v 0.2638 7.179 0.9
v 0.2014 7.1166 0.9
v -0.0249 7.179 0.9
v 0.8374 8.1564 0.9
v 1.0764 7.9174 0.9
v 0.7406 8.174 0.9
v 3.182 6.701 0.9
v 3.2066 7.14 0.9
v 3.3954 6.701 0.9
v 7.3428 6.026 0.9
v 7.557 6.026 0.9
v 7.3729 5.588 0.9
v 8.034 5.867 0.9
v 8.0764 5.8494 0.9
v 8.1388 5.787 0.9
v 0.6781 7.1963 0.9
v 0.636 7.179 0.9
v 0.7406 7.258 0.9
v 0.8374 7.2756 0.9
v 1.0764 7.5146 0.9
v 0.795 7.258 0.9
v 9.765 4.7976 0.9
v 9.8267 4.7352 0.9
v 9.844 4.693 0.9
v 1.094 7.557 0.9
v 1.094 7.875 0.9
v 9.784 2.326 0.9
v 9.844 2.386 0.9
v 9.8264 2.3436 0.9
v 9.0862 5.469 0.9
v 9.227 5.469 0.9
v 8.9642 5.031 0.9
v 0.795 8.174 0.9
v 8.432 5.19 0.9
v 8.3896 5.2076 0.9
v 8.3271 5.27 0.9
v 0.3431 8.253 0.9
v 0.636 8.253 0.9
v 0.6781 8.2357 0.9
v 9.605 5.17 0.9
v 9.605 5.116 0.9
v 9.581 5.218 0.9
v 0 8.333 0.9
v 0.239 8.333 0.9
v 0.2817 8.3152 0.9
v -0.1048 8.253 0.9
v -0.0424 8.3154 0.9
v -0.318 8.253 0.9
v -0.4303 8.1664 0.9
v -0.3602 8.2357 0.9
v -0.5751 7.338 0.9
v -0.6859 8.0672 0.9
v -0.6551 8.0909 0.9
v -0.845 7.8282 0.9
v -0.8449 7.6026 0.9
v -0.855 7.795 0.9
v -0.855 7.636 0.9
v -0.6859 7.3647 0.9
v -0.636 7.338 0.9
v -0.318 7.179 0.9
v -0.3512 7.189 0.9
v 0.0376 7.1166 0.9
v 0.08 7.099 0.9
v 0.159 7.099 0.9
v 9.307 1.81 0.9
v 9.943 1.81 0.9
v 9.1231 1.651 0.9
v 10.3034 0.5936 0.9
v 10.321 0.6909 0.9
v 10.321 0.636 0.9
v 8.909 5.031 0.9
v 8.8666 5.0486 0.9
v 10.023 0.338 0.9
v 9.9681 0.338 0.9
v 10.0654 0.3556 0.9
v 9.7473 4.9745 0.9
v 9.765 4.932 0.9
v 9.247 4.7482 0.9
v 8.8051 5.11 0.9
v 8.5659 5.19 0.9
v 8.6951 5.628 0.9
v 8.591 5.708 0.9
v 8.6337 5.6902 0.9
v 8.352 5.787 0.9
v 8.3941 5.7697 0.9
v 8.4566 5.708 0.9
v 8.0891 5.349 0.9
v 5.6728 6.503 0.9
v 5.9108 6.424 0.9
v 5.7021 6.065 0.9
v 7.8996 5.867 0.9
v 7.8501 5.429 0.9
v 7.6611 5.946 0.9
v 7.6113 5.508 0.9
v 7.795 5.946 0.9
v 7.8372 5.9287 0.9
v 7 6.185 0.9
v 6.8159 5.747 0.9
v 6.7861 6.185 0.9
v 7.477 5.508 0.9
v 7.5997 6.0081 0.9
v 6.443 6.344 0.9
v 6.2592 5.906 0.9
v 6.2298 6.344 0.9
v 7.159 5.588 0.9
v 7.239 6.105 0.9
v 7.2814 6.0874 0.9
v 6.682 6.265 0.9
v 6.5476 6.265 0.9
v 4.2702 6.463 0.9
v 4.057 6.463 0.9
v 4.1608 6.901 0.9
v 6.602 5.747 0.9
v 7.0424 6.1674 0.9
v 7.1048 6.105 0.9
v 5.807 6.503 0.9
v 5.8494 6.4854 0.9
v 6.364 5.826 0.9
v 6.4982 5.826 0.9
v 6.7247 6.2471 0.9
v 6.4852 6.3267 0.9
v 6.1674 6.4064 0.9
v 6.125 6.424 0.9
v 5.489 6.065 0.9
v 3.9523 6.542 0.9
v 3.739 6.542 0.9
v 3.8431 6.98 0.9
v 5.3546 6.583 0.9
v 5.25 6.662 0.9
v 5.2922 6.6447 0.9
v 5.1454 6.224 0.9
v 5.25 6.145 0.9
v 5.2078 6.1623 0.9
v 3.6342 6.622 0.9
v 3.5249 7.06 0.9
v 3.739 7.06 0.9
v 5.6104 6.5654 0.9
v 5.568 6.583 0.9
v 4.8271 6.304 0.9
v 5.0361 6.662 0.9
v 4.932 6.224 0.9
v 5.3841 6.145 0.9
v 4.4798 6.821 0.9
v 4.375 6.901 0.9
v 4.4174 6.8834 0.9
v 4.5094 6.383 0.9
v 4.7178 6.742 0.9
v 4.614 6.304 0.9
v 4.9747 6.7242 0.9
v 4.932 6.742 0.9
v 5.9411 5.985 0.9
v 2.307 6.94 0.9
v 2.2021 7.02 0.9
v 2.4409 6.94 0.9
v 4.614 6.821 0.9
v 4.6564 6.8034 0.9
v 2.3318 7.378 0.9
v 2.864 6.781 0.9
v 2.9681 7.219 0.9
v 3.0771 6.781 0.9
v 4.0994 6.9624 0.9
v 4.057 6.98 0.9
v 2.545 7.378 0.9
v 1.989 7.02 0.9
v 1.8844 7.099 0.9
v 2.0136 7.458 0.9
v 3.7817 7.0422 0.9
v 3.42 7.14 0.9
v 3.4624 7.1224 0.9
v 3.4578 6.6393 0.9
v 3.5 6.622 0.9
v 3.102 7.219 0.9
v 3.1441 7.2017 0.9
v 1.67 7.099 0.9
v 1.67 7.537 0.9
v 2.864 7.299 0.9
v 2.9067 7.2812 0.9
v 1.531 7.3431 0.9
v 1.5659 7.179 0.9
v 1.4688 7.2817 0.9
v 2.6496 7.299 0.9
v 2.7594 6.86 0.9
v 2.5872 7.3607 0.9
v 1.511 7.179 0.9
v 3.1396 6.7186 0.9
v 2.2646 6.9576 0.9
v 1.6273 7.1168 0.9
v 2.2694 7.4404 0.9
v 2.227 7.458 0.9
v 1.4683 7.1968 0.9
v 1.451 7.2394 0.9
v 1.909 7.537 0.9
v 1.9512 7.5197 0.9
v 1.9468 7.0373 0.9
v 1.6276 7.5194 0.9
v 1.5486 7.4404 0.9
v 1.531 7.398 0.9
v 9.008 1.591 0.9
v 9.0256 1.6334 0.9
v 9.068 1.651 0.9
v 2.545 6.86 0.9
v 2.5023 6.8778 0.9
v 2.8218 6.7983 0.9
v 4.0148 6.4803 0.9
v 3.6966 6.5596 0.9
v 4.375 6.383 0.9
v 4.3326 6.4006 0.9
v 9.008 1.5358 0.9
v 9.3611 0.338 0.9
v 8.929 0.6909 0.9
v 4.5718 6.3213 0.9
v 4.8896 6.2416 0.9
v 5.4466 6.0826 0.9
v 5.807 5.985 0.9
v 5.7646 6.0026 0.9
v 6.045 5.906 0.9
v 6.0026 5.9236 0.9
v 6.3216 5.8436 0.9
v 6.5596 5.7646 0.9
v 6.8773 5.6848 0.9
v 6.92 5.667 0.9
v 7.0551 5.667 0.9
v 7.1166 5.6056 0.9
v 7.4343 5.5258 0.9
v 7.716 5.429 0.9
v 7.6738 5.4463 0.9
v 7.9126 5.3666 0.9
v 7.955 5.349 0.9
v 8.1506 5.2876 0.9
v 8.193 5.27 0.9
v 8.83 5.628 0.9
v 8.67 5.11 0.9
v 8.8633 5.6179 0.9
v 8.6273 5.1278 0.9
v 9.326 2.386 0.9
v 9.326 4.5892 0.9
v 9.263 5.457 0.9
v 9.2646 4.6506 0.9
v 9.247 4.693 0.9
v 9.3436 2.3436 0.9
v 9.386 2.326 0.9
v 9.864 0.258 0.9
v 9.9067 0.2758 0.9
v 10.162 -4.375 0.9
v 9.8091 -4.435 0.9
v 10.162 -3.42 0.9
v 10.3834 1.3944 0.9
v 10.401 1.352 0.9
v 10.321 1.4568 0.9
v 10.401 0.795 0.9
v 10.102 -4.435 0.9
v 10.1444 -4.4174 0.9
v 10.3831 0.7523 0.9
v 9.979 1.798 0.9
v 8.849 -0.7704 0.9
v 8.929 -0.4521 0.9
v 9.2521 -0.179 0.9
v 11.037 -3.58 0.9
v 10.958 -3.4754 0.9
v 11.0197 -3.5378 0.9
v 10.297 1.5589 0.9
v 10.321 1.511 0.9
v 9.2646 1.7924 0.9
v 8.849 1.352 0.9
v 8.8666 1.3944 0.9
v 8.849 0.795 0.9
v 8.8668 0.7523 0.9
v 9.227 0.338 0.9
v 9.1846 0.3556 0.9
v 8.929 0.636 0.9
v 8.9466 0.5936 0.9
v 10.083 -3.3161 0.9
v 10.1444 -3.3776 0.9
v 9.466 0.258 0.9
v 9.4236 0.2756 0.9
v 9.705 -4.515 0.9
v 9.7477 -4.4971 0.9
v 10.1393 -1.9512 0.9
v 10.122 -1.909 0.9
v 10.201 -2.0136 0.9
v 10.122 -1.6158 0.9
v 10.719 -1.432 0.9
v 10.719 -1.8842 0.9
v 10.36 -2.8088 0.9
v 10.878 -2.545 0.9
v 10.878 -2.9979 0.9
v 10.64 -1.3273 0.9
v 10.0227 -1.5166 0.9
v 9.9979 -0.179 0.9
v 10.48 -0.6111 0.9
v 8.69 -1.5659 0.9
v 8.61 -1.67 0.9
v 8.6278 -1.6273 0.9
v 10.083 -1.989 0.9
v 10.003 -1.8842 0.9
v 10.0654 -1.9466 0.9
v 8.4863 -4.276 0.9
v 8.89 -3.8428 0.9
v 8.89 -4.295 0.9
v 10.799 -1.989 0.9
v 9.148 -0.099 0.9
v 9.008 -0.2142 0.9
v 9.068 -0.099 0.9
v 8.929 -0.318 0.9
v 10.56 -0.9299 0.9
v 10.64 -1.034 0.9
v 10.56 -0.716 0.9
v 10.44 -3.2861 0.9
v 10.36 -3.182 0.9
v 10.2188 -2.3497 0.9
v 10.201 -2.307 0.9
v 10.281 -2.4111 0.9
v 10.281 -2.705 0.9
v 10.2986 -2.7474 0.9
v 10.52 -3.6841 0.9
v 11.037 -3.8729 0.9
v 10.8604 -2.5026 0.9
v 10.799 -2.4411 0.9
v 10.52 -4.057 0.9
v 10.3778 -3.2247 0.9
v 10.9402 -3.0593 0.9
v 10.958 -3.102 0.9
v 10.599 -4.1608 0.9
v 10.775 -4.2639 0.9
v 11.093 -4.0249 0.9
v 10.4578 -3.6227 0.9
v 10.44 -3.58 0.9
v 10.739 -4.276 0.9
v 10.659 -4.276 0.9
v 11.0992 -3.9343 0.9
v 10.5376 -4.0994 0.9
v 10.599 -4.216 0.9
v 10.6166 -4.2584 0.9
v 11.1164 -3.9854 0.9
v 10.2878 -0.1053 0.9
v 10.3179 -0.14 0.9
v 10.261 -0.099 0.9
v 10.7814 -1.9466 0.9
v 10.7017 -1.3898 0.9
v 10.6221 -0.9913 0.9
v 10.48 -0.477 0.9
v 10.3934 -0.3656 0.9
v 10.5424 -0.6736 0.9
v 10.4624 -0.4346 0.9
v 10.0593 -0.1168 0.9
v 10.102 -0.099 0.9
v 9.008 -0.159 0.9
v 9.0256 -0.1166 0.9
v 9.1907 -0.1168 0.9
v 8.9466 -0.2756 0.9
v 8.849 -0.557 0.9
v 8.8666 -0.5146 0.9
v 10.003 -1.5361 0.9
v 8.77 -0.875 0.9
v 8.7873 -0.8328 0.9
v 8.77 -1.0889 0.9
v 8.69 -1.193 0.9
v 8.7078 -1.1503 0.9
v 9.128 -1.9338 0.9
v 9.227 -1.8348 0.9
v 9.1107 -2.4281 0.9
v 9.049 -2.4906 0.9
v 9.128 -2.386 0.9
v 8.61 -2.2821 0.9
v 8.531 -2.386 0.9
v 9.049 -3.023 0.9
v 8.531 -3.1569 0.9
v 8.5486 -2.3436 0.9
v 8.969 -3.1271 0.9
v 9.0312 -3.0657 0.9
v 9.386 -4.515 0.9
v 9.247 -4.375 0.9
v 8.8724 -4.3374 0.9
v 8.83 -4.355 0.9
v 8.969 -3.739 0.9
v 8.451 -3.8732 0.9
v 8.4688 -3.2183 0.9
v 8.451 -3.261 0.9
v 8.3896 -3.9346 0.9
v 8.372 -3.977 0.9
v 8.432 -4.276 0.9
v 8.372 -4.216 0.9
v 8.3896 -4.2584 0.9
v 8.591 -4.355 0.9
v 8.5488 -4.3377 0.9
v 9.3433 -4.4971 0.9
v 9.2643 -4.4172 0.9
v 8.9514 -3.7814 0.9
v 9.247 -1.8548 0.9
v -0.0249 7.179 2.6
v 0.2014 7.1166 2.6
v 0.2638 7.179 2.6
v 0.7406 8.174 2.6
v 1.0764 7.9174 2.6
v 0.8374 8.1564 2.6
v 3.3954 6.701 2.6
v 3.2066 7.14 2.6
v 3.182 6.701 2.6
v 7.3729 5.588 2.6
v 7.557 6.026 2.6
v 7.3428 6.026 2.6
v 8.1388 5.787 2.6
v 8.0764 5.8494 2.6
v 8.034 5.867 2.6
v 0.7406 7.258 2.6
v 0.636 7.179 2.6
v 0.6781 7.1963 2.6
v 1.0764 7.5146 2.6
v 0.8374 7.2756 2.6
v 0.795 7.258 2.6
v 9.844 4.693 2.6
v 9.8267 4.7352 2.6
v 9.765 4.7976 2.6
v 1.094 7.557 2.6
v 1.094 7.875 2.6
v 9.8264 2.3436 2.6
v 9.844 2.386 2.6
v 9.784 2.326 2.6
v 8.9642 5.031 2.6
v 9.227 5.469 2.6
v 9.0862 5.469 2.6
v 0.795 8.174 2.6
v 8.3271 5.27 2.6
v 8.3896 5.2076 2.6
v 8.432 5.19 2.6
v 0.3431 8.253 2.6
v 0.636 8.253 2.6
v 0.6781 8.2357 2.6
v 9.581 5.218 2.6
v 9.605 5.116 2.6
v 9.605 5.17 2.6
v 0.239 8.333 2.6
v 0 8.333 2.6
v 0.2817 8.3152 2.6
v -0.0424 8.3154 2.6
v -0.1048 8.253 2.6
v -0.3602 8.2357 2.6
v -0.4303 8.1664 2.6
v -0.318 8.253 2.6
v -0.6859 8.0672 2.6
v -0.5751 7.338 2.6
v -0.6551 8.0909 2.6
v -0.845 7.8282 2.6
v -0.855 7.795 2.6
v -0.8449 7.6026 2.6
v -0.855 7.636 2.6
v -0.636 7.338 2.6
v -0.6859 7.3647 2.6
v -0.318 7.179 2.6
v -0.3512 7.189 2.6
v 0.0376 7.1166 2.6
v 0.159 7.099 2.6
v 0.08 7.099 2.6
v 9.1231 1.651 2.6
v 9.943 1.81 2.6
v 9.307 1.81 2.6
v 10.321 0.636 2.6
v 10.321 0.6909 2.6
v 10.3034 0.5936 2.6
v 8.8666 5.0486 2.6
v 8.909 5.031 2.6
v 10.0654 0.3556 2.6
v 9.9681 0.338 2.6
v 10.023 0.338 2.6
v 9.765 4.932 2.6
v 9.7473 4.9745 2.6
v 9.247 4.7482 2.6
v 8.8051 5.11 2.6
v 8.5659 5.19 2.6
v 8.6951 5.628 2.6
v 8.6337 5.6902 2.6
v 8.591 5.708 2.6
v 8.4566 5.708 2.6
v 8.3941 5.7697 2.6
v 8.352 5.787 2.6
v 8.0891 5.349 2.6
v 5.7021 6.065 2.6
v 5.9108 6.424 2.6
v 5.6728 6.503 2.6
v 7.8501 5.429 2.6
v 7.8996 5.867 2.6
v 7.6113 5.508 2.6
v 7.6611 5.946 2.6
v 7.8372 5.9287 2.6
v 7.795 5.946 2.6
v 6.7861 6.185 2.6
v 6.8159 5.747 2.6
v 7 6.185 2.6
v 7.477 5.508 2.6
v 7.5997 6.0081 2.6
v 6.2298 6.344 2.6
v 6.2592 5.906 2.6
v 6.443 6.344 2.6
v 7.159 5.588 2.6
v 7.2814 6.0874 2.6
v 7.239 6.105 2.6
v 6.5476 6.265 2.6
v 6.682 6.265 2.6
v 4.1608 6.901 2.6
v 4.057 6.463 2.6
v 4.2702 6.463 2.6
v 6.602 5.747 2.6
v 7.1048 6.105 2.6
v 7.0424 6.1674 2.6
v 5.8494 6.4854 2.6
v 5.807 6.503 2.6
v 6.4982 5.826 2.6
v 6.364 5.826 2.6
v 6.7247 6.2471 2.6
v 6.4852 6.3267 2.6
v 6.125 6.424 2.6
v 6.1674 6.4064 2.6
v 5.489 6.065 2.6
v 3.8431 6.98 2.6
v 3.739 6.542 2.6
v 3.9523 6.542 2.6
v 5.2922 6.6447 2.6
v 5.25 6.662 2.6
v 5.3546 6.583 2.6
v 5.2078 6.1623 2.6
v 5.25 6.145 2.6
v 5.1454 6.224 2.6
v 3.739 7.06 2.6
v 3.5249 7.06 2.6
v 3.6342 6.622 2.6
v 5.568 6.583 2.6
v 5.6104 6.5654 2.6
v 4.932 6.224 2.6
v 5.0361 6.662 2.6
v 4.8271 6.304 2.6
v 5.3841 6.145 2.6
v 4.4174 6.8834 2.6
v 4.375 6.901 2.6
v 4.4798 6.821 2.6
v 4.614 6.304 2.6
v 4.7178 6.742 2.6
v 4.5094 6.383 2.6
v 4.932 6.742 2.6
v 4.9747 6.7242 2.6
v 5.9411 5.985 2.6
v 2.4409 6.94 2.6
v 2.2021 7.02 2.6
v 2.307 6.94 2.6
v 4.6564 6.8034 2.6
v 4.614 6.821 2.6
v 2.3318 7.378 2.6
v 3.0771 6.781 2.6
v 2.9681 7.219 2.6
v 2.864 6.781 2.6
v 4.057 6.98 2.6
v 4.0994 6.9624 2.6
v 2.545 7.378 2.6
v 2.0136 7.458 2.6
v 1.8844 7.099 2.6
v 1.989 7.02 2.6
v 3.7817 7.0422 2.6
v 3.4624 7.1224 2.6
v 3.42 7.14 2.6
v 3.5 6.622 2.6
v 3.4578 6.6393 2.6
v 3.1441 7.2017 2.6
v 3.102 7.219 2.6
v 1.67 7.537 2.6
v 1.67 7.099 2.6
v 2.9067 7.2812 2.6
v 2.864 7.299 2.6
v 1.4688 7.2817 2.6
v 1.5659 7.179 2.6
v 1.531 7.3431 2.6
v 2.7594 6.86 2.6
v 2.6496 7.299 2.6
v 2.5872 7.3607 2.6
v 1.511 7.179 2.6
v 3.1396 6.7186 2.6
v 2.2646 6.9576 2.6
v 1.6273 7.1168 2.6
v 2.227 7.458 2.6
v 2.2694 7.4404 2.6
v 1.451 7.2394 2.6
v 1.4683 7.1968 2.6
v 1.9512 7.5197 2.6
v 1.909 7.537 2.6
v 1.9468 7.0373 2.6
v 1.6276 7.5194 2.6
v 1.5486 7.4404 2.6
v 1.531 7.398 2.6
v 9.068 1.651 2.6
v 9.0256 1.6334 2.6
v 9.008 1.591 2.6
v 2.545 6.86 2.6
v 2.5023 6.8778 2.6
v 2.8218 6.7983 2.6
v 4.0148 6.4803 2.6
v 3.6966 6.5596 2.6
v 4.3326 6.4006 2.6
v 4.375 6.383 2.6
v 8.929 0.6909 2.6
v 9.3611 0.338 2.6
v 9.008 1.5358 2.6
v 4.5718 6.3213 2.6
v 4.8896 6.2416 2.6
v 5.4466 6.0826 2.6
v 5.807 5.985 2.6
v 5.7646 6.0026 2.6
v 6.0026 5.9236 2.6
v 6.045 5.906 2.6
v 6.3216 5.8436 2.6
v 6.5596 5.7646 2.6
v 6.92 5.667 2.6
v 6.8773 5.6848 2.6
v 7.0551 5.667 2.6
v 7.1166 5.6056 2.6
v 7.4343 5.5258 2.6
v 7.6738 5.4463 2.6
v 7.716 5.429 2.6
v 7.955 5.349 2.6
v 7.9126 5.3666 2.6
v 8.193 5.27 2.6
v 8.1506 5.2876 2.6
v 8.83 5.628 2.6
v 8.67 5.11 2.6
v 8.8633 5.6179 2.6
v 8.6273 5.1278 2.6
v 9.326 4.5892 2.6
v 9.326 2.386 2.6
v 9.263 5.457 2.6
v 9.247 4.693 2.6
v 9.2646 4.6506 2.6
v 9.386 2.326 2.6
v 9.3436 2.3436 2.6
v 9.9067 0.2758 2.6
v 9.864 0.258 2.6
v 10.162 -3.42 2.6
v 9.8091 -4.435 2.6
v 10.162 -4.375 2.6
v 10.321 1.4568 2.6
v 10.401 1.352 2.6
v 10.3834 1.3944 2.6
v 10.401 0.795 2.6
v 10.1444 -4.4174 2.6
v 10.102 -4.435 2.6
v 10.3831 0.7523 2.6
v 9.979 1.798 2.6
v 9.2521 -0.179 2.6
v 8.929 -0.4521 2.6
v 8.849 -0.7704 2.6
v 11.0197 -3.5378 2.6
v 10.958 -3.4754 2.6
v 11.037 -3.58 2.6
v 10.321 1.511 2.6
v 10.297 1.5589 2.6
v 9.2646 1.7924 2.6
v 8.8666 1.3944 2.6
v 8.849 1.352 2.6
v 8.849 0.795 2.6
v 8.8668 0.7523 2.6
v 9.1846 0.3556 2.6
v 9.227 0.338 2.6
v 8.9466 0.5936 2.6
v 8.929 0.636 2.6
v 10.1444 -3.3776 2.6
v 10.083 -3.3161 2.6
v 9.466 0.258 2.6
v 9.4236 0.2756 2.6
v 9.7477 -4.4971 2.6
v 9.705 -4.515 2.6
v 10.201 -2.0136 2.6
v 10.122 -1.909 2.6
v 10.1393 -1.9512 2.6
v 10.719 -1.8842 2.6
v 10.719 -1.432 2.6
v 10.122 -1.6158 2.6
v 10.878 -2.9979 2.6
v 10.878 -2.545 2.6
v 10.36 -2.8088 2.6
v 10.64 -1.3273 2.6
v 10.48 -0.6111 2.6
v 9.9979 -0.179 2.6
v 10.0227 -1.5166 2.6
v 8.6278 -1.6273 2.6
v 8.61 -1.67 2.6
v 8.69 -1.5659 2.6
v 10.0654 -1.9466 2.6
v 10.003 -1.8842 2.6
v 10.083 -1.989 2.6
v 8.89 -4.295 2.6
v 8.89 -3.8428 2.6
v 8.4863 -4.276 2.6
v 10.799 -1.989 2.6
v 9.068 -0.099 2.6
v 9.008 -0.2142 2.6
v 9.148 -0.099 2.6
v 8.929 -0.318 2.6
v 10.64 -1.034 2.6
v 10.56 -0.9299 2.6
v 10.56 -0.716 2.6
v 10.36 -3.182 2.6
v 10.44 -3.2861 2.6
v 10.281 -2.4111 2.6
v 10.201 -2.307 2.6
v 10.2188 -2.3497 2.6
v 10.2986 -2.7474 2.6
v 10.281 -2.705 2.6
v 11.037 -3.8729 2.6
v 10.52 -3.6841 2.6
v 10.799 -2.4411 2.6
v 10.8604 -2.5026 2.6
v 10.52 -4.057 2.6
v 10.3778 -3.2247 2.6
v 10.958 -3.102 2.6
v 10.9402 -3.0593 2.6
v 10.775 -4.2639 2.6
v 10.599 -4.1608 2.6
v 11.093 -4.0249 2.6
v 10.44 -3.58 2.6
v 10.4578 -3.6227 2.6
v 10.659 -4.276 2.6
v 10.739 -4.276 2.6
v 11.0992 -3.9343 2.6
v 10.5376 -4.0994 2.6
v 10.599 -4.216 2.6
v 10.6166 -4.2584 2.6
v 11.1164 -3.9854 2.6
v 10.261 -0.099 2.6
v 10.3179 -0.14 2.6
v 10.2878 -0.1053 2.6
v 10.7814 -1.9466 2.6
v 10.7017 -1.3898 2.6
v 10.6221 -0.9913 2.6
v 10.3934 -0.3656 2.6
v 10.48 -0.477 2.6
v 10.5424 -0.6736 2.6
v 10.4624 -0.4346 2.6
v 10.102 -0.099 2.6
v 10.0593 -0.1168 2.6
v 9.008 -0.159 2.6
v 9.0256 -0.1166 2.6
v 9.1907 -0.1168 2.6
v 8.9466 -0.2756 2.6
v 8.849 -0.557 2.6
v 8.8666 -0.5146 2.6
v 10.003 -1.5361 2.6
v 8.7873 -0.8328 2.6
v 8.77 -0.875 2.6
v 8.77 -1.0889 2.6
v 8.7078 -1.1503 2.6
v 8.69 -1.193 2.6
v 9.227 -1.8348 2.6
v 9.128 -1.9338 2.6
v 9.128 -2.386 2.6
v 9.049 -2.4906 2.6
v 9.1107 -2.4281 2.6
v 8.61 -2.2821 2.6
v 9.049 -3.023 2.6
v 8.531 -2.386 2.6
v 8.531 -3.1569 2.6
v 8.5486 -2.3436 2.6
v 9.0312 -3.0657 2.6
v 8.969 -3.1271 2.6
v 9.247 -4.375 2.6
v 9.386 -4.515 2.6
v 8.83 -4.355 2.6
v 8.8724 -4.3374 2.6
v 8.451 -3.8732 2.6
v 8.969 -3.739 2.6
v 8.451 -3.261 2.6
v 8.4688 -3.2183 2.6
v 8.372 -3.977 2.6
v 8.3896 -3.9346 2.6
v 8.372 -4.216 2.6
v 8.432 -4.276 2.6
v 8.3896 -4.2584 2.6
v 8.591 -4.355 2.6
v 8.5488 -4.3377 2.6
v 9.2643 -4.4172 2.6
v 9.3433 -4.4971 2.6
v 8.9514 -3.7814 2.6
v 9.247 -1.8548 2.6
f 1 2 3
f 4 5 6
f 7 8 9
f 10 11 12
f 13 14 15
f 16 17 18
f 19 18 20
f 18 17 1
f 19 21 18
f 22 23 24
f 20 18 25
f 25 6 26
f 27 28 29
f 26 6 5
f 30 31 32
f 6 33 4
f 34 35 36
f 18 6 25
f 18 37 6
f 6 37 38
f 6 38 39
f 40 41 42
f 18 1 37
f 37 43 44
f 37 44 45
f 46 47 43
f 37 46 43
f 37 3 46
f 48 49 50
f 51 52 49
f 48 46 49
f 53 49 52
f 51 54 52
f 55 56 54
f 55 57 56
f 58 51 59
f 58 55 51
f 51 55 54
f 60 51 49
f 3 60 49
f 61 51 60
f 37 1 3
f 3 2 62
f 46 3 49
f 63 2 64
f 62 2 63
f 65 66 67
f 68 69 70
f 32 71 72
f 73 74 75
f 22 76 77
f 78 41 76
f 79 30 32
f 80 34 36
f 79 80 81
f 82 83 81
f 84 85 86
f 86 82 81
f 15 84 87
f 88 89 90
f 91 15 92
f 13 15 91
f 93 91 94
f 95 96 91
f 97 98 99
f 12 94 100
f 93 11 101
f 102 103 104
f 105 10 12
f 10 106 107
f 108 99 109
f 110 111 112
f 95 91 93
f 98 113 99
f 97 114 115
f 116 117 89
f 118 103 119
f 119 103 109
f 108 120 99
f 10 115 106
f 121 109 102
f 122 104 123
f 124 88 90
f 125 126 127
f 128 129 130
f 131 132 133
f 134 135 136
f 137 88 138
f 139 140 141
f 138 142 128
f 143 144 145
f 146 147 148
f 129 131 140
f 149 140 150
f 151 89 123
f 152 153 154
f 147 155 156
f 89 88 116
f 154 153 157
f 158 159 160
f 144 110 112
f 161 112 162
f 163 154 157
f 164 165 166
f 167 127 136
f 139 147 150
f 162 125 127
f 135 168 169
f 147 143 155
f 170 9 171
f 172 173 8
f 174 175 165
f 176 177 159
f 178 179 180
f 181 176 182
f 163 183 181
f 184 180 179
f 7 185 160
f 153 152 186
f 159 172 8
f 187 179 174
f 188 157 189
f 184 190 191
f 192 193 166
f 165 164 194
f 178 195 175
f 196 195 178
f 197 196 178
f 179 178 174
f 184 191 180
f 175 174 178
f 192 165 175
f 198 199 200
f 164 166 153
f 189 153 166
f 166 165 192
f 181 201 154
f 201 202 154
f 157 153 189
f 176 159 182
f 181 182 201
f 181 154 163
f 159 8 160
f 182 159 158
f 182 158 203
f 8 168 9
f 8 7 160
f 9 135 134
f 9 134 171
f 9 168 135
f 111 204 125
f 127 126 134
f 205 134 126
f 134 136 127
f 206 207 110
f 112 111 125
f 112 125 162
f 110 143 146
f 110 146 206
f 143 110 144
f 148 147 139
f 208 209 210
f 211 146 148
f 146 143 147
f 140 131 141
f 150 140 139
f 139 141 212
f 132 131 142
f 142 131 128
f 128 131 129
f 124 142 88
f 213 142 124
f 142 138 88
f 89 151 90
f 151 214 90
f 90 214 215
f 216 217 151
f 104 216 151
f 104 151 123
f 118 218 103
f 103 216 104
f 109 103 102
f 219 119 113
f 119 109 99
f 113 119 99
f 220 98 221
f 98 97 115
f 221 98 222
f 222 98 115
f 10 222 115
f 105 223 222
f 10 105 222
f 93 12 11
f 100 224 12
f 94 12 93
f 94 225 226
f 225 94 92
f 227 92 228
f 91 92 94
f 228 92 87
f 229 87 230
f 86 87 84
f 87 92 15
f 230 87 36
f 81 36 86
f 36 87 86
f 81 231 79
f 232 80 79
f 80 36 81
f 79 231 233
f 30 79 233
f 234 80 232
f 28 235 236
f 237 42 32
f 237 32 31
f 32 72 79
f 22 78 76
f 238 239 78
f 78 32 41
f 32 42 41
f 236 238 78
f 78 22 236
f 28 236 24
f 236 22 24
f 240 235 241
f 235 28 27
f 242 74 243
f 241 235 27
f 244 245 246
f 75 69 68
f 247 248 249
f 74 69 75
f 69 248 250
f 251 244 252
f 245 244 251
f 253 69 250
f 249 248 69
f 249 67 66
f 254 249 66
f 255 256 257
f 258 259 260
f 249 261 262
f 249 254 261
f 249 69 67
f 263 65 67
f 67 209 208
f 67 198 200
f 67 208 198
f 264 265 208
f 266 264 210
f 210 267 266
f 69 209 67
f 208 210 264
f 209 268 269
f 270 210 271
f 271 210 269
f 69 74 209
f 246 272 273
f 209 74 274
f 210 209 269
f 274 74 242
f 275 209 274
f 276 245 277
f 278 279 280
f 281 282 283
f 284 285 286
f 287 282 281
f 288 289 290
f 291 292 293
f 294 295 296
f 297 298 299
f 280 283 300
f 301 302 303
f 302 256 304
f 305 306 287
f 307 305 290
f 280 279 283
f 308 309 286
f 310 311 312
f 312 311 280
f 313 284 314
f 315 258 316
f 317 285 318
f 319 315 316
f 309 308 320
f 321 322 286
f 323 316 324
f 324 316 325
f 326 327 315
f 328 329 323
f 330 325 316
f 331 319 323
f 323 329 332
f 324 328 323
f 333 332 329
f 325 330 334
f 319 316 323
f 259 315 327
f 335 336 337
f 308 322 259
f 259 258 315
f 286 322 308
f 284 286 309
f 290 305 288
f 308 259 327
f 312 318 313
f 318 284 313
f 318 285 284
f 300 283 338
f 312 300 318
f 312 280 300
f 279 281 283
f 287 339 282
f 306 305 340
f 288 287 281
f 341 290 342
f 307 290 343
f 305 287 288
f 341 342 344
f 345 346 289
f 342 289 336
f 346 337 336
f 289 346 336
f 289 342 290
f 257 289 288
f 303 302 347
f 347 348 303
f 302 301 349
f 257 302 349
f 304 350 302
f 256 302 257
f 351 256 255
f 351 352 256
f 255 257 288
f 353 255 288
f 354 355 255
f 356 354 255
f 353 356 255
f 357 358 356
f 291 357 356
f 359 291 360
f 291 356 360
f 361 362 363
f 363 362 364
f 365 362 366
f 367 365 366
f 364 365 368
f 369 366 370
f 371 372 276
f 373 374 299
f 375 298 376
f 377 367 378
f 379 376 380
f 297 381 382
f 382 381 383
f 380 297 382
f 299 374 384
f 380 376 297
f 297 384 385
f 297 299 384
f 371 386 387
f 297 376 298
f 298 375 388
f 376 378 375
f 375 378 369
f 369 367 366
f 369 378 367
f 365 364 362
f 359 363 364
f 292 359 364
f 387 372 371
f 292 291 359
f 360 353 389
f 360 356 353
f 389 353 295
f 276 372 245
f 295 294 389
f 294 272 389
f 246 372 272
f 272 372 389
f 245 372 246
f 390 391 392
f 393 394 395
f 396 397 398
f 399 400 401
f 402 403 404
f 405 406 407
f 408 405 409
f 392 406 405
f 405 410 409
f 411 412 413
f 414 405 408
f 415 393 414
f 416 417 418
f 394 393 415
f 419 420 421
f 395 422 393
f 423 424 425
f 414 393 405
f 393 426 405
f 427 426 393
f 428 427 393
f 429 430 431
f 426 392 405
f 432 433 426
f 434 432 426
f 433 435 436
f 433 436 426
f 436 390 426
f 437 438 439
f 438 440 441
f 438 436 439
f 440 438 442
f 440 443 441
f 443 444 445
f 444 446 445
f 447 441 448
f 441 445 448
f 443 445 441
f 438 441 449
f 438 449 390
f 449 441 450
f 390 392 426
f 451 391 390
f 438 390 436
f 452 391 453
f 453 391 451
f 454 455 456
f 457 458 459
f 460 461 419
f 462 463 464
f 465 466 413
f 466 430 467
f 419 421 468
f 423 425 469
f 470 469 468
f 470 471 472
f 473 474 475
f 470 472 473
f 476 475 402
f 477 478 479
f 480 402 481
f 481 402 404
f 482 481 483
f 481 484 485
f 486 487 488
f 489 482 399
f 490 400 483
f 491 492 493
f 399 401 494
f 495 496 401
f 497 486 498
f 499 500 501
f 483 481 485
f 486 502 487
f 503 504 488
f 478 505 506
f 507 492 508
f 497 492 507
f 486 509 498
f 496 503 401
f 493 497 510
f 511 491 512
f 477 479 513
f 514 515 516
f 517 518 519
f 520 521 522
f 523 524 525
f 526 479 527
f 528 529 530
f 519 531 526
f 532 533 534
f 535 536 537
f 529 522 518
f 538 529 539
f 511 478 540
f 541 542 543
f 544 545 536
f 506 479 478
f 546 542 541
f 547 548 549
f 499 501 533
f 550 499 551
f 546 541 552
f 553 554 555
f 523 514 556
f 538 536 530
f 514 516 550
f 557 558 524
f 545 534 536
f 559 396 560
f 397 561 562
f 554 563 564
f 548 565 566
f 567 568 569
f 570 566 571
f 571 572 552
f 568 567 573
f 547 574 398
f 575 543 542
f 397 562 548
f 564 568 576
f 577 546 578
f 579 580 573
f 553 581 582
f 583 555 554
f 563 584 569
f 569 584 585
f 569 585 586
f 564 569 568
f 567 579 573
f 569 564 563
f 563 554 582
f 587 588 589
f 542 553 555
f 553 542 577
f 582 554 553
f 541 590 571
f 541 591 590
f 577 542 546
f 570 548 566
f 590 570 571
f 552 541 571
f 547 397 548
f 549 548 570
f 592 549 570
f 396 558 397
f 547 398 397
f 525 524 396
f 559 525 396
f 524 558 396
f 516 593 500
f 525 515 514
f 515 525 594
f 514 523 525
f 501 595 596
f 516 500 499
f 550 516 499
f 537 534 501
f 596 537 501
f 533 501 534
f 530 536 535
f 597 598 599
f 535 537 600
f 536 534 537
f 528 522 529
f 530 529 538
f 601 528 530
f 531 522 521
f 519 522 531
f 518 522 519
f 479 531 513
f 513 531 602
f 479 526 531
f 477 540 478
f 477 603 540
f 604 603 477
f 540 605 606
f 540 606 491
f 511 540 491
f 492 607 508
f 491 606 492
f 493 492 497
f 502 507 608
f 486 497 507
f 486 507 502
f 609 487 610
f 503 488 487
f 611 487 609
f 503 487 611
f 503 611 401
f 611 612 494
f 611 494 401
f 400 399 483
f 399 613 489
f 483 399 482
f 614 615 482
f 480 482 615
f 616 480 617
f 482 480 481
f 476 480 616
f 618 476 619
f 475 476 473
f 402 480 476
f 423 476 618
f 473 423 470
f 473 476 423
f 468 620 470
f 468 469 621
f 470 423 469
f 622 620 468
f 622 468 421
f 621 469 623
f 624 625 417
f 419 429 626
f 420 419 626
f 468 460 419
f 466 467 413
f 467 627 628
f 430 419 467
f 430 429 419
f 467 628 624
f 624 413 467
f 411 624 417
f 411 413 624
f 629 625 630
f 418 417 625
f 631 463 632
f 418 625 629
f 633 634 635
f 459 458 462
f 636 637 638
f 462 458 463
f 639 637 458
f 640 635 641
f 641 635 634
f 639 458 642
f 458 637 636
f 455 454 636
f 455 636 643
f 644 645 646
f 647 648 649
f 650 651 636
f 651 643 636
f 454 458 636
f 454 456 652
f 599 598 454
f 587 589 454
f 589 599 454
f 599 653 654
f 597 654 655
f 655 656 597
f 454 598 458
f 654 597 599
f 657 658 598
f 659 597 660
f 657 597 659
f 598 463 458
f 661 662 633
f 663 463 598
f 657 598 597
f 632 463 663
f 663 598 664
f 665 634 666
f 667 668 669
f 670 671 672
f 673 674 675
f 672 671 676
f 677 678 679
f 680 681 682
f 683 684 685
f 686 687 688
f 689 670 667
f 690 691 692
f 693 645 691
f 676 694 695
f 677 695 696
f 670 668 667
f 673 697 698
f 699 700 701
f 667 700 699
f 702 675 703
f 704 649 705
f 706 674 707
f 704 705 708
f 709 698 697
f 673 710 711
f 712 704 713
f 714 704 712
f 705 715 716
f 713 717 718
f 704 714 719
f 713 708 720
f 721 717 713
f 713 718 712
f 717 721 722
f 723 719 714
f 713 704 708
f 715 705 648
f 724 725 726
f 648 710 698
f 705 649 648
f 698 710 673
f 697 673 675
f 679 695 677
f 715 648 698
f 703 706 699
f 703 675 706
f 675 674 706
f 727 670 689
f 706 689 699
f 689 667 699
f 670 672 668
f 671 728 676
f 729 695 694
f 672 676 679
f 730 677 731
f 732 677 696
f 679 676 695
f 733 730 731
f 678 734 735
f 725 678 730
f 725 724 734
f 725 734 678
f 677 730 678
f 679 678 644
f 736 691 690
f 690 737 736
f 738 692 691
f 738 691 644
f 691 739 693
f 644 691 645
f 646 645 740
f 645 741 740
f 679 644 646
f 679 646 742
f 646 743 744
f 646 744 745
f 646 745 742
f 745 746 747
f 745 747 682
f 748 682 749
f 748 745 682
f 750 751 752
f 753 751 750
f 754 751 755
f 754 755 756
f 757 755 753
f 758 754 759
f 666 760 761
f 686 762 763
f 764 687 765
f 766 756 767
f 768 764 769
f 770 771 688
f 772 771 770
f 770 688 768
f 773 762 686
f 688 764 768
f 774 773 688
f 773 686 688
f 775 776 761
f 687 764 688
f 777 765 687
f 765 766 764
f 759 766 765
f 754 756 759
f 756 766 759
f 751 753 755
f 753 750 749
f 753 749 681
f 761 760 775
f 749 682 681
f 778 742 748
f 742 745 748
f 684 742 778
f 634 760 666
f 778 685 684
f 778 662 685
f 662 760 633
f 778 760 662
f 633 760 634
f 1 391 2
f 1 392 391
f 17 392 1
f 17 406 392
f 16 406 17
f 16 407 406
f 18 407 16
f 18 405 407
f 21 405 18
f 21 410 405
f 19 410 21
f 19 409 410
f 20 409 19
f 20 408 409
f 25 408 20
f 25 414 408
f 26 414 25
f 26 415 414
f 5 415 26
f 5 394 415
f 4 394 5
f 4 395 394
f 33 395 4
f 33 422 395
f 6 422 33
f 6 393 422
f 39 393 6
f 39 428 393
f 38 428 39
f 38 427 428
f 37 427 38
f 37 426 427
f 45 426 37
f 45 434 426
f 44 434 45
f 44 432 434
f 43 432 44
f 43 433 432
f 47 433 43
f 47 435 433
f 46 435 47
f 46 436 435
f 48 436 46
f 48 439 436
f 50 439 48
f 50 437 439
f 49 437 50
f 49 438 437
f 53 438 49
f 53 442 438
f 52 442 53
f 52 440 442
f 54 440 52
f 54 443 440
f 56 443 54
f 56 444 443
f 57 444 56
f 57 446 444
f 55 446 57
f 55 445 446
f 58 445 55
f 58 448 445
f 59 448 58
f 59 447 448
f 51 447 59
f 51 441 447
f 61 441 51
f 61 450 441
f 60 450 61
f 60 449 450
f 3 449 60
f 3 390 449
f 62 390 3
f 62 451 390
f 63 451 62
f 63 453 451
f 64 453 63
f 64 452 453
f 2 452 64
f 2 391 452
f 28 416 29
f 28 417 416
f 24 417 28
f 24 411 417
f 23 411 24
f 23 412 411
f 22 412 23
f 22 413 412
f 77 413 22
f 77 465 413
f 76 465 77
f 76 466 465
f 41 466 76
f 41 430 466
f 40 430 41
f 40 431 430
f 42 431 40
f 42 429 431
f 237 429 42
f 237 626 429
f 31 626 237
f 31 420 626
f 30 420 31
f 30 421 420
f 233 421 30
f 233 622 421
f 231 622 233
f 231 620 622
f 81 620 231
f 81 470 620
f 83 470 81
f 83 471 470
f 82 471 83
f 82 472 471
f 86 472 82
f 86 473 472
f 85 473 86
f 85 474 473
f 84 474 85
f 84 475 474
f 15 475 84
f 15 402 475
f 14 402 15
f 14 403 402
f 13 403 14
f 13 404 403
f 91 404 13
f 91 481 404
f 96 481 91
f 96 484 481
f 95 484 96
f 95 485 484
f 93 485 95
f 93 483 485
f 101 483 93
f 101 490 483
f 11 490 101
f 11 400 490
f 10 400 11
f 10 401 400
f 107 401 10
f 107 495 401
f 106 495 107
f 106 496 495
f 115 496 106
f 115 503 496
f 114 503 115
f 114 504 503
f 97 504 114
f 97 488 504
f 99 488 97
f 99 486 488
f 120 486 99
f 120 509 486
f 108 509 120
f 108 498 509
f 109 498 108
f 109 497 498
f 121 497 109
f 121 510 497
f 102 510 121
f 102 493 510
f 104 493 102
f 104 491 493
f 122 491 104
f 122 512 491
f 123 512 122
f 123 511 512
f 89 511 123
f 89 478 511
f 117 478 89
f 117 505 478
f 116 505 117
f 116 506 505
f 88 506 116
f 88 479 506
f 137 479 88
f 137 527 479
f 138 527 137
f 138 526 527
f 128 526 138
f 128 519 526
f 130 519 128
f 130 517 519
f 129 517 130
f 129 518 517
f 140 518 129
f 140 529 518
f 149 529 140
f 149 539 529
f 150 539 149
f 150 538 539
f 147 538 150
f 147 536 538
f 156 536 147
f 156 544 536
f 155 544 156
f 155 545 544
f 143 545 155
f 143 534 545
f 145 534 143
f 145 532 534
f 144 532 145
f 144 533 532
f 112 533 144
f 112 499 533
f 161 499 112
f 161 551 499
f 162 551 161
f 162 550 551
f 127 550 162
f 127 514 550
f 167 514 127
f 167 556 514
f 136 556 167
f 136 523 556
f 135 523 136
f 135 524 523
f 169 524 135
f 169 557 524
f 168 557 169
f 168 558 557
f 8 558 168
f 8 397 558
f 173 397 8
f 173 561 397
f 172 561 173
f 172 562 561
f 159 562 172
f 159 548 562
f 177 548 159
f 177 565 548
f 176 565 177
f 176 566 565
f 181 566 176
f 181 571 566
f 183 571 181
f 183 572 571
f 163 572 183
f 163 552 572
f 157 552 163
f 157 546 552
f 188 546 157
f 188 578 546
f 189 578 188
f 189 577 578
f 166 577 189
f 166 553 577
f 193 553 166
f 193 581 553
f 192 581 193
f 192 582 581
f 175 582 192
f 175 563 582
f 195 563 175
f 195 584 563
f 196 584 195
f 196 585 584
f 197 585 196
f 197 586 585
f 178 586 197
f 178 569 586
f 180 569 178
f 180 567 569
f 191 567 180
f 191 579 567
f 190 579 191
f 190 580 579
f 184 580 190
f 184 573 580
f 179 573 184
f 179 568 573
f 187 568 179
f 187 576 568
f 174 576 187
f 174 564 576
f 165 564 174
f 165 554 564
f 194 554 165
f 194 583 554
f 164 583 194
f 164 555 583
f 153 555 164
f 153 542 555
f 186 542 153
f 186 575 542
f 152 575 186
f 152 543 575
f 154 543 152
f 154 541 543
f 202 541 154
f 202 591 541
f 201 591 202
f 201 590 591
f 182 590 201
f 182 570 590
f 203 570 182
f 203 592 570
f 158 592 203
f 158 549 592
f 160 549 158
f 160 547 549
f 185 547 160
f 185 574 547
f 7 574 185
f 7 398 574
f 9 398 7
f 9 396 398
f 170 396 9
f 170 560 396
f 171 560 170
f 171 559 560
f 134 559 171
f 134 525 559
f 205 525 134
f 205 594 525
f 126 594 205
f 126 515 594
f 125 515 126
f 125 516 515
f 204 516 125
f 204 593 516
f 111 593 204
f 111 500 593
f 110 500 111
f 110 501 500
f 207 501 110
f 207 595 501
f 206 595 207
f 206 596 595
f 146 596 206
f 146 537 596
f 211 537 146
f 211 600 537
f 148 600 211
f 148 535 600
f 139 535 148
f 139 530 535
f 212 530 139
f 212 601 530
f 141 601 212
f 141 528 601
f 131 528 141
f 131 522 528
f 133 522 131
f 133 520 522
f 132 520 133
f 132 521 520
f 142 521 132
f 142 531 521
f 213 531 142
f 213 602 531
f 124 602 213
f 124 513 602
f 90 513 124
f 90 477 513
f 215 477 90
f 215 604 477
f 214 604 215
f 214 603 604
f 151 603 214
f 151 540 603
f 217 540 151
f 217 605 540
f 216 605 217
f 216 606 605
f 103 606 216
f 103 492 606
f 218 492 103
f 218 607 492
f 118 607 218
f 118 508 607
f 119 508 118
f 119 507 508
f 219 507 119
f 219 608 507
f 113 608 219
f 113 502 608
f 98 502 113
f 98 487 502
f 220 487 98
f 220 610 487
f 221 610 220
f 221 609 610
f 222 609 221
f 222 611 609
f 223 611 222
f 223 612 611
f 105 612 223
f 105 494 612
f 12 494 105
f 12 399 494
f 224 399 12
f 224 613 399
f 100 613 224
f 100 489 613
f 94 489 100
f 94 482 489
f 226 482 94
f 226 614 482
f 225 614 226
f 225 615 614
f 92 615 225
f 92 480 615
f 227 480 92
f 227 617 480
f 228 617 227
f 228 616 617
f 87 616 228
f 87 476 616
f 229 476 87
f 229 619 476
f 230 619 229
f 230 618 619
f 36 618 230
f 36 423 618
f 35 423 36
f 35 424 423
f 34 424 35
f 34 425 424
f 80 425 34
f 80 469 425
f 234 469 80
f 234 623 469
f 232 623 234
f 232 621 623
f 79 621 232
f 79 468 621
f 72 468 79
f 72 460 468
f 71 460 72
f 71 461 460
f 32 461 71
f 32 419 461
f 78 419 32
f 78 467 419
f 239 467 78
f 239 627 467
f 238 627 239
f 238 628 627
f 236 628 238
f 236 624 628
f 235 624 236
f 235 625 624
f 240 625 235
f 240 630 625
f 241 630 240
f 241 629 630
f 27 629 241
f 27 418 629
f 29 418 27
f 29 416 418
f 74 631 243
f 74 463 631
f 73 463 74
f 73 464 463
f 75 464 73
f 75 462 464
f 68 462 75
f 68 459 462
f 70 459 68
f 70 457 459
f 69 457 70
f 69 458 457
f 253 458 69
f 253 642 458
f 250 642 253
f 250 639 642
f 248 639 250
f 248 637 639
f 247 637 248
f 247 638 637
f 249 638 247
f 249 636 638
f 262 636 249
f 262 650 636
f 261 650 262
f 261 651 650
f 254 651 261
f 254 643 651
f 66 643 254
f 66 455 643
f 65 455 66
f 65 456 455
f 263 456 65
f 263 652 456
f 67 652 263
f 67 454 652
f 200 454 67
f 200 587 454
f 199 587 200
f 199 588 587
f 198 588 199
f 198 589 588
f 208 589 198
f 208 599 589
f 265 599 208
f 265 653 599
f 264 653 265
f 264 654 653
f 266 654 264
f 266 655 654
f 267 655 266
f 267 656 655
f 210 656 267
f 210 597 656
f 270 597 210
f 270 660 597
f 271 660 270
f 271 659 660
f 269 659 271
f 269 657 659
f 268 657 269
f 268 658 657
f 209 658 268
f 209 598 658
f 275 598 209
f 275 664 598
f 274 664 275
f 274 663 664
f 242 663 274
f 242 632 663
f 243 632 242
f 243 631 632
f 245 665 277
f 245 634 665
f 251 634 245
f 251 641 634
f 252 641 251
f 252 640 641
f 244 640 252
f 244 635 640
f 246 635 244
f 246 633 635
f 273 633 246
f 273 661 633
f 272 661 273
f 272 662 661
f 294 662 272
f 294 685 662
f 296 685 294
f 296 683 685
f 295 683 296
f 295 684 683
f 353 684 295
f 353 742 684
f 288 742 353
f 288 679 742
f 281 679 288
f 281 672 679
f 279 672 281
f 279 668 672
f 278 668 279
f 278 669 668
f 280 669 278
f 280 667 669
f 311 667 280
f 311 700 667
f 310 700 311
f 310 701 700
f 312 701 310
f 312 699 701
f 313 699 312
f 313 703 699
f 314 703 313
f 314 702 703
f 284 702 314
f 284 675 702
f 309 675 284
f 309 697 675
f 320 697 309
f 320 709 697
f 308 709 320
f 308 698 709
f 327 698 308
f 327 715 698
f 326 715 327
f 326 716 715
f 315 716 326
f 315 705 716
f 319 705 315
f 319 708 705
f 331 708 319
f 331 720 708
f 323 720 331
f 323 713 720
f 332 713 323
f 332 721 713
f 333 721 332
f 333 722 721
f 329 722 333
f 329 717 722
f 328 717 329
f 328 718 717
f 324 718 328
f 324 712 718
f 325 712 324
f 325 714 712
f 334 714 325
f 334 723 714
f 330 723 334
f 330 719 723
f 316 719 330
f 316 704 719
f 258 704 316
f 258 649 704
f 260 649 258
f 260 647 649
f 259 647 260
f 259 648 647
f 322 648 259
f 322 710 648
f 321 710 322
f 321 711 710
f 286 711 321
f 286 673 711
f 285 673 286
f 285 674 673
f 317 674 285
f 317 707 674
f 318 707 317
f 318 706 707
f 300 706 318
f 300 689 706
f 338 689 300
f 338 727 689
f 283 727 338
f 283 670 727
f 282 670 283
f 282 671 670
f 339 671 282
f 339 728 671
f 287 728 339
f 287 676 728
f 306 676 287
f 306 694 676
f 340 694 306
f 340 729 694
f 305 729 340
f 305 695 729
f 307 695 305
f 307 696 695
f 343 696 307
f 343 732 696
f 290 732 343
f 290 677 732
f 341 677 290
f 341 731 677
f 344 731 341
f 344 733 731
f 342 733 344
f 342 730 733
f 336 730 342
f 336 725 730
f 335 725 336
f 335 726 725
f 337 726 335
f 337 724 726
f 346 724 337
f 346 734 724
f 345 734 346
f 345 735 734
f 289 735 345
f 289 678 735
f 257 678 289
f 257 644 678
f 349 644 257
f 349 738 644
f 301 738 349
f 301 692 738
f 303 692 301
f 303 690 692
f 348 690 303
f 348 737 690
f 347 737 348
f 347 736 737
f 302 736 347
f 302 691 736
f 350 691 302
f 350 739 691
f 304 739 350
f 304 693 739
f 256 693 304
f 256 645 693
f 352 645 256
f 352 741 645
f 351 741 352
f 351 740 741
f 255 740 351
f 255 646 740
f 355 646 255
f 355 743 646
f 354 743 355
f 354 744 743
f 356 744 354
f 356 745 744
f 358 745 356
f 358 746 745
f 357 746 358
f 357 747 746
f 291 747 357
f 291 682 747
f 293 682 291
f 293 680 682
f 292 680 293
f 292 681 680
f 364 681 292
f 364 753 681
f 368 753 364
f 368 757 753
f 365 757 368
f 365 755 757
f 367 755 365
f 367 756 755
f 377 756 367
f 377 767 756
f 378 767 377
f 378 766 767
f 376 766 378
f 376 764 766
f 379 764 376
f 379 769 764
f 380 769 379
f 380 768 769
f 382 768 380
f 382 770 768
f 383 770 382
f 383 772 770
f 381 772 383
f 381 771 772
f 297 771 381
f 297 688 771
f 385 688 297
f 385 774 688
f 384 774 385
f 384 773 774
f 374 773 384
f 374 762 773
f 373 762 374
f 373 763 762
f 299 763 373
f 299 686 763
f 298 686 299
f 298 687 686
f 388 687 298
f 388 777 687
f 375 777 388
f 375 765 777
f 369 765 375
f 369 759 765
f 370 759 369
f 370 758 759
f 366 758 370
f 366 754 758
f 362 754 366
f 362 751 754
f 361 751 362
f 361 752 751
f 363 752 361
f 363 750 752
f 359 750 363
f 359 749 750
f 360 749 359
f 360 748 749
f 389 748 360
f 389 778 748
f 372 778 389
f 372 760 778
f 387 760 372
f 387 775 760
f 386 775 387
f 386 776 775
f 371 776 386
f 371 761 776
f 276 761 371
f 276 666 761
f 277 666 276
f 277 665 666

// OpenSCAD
$fn = 24;
translate([0, 0.000, 0.900])
  linear_extrude(height=1.700) {
offset(r=0.06, $fn=8) {
    polygon(points=[[9.068,-0.159],[9.068,-0.239],[8.989,-0.318],[8.989,-0.477],[8.909,-0.557],[8.909,-0.795],[8.830,-0.875],[8.830,-1.114],[8.750,-1.193],[8.750,-1.591],[8.670,-1.670],[8.670,-2.307],[8.591,-2.386],[8.591,-3.182],[8.511,-3.261],[8.511,-3.898],[8.432,-3.977],[8.432,-4.216],[8.511,-4.216],[8.591,-4.295],[8.830,-4.295],[8.830,-3.818],[8.909,-3.739],[8.909,-3.102],[8.989,-3.023],[8.989,-2.466],[9.068,-2.386],[9.068,-1.909],[9.227,-1.750],[9.307,-1.830],[9.307,-4.375],[9.386,-4.455],[9.705,-4.455],[9.784,-4.375],[10.102,-4.375],[10.102,-3.420],[10.023,-3.341],[10.023,-1.989],[9.943,-1.909],[9.943,-1.511],[10.023,-1.432],[10.182,-1.591],[10.182,-1.909],[10.261,-1.989],[10.261,-2.307],[10.341,-2.386],[10.341,-2.705],[10.420,-2.784],[10.420,-3.182],[10.500,-3.261],[10.500,-3.580],[10.580,-3.659],[10.580,-4.057],[10.659,-4.136],[10.659,-4.216],[10.739,-4.216],[11.057,-3.977],[10.977,-3.898],[10.977,-3.580],[10.898,-3.500],[10.898,-3.102],[10.818,-3.023],[10.818,-2.545],[10.739,-2.466],[10.739,-1.989],[10.659,-1.909],[10.659,-1.432],[10.580,-1.352],[10.580,-1.034],[10.500,-0.955],[10.500,-0.716],[10.420,-0.636],[10.420,-0.477],[10.341,-0.398],[10.261,-0.159],[10.102,-0.159],[10.023,-0.239],[9.227,-0.239],[9.148,-0.159]], paths=[[0,1,2,3,4,5,6,7,8,9,10,11,12,13,14,15,16,17,18,19,20,21,22,23,24,25,26,27,28,29,30,31,32,33,34,35,36,37,38,39,40,41,42,43,44,45,46,47,48,49,50,51,52,53,54,55,56,57,58,59,60,61,62,63,64,65,66,67,68,69,70,71,72,73,74,75,76,77,78]]);
    polygon(points=[[9.307,1.750],[9.148,1.591],[9.068,1.591],[9.068,1.511],[8.909,1.352],[8.909,0.795],[8.989,0.716],[8.989,0.636],[9.227,0.398],[9.386,0.398],[9.466,0.318],[9.864,0.318],[9.943,0.398],[10.023,0.398],[10.261,0.636],[10.261,0.716],[10.341,0.795],[10.341,1.352],[10.261,1.432],[10.261,1.511],[9.943,1.750]], paths=[[0,1,2,3,4,5,6,7,8,9,10,11,12,13,14,15,16,17,18,19,20]]);
    polygon(points=[[1.591,7.398],[1.591,7.318],[1.511,7.239],[1.591,7.239],[1.670,7.159],[1.909,7.159],[1.989,7.080],[2.227,7.080],[2.307,7.000],[2.466,7.000],[2.545,6.920],[2.784,6.920],[2.864,6.841],[3.102,6.841],[3.182,6.761],[3.420,6.761],[3.500,6.682],[3.659,6.682],[3.739,6.602],[3.977,6.602],[4.057,6.523],[4.295,6.523],[4.375,6.443],[4.534,6.443],[4.614,6.364],[4.852,6.364],[4.932,6.284],[5.170,6.284],[5.250,6.205],[5.409,6.205],[5.489,6.125],[5.727,6.125],[5.807,6.045],[5.966,6.045],[6.045,5.966],[6.284,5.966],[6.364,5.886],[6.523,5.886],[6.602,5.807],[6.841,5.807],[6.920,5.727],[7.080,5.727],[7.159,5.648],[7.398,5.648],[7.477,5.568],[7.636,5.568],[7.716,5.489],[7.875,5.489],[7.955,5.409],[8.114,5.409],[8.193,5.330],[8.352,5.330],[8.432,5.250],[8.591,5.250],[8.670,5.170],[8.830,5.170],[8.909,5.091],[8.989,5.091],[9.307,4.773],[9.307,4.693],[9.386,4.614],[9.386,2.386],[9.784,2.386],[9.784,4.693],[9.705,4.773],[9.705,4.932],[9.545,5.091],[9.545,5.170],[9.227,5.409],[9.068,5.409],[8.830,5.568],[8.670,5.568],[8.591,5.648],[8.432,5.648],[8.352,5.727],[8.114,5.727],[8.034,5.807],[7.875,5.807],[7.795,5.886],[7.636,5.886],[7.557,5.966],[7.318,5.966],[7.239,6.045],[7.080,6.045],[7.000,6.125],[6.761,6.125],[6.682,6.205],[6.523,6.205],[6.443,6.284],[6.205,6.284],[6.125,6.364],[5.886,6.364],[5.807,6.443],[5.648,6.443],[5.568,6.523],[5.330,6.523],[5.250,6.602],[5.011,6.602],[4.932,6.682],[4.693,6.682],[4.614,6.761],[4.455,6.761],[4.375,6.841],[4.136,6.841],[4.057,6.920],[3.818,6.920],[3.739,7.000],[3.500,7.000],[3.420,7.080],[3.182,7.080],[3.102,7.159],[2.943,7.159],[2.864,7.239],[2.625,7.239],[2.545,7.318],[2.307,7.318],[2.227,7.398],[1.989,7.398],[1.909,7.477],[1.670,7.477]], paths=[[0,1,2,3,4,5,6,7,8,9,10,11,12,13,14,15,16,17,18,19,20,21,22,23,24,25,26,27,28,29,30,31,32,33,34,35,36,37,38,39,40,41,42,43,44,45,46,47,48,49,50,51,52,53,54,55,56,57,58,59,60,61,62,63,64,65,66,67,68,69,70,71,72,73,74,75,76,77,78,79,80,81,82,83,84,85,86,87,88,89,90,91,92,93,94,95,96,97,98,99,100,101,102,103,104,105,106,107,108,109,110,111,112,113,114,115,116,117,118,119]]);
    polygon(points=[[-0.795,7.795],[-0.795,7.636],[-0.636,7.398],[-0.557,7.398],[-0.318,7.239],[0.000,7.239],[0.080,7.159],[0.159,7.159],[0.239,7.239],[0.636,7.239],[0.716,7.318],[0.795,7.318],[1.034,7.557],[1.034,7.875],[0.795,8.114],[0.716,8.114],[0.636,8.193],[0.318,8.193],[0.239,8.273],[0.000,8.273],[-0.080,8.193],[-0.318,8.193],[-0.398,8.114],[-0.636,8.034]], paths=[[0,1,2,3,4,5,6,7,8,9,10,11,12,13,14,15,16,17,18,19,20,21,22,23]]);
}
}
